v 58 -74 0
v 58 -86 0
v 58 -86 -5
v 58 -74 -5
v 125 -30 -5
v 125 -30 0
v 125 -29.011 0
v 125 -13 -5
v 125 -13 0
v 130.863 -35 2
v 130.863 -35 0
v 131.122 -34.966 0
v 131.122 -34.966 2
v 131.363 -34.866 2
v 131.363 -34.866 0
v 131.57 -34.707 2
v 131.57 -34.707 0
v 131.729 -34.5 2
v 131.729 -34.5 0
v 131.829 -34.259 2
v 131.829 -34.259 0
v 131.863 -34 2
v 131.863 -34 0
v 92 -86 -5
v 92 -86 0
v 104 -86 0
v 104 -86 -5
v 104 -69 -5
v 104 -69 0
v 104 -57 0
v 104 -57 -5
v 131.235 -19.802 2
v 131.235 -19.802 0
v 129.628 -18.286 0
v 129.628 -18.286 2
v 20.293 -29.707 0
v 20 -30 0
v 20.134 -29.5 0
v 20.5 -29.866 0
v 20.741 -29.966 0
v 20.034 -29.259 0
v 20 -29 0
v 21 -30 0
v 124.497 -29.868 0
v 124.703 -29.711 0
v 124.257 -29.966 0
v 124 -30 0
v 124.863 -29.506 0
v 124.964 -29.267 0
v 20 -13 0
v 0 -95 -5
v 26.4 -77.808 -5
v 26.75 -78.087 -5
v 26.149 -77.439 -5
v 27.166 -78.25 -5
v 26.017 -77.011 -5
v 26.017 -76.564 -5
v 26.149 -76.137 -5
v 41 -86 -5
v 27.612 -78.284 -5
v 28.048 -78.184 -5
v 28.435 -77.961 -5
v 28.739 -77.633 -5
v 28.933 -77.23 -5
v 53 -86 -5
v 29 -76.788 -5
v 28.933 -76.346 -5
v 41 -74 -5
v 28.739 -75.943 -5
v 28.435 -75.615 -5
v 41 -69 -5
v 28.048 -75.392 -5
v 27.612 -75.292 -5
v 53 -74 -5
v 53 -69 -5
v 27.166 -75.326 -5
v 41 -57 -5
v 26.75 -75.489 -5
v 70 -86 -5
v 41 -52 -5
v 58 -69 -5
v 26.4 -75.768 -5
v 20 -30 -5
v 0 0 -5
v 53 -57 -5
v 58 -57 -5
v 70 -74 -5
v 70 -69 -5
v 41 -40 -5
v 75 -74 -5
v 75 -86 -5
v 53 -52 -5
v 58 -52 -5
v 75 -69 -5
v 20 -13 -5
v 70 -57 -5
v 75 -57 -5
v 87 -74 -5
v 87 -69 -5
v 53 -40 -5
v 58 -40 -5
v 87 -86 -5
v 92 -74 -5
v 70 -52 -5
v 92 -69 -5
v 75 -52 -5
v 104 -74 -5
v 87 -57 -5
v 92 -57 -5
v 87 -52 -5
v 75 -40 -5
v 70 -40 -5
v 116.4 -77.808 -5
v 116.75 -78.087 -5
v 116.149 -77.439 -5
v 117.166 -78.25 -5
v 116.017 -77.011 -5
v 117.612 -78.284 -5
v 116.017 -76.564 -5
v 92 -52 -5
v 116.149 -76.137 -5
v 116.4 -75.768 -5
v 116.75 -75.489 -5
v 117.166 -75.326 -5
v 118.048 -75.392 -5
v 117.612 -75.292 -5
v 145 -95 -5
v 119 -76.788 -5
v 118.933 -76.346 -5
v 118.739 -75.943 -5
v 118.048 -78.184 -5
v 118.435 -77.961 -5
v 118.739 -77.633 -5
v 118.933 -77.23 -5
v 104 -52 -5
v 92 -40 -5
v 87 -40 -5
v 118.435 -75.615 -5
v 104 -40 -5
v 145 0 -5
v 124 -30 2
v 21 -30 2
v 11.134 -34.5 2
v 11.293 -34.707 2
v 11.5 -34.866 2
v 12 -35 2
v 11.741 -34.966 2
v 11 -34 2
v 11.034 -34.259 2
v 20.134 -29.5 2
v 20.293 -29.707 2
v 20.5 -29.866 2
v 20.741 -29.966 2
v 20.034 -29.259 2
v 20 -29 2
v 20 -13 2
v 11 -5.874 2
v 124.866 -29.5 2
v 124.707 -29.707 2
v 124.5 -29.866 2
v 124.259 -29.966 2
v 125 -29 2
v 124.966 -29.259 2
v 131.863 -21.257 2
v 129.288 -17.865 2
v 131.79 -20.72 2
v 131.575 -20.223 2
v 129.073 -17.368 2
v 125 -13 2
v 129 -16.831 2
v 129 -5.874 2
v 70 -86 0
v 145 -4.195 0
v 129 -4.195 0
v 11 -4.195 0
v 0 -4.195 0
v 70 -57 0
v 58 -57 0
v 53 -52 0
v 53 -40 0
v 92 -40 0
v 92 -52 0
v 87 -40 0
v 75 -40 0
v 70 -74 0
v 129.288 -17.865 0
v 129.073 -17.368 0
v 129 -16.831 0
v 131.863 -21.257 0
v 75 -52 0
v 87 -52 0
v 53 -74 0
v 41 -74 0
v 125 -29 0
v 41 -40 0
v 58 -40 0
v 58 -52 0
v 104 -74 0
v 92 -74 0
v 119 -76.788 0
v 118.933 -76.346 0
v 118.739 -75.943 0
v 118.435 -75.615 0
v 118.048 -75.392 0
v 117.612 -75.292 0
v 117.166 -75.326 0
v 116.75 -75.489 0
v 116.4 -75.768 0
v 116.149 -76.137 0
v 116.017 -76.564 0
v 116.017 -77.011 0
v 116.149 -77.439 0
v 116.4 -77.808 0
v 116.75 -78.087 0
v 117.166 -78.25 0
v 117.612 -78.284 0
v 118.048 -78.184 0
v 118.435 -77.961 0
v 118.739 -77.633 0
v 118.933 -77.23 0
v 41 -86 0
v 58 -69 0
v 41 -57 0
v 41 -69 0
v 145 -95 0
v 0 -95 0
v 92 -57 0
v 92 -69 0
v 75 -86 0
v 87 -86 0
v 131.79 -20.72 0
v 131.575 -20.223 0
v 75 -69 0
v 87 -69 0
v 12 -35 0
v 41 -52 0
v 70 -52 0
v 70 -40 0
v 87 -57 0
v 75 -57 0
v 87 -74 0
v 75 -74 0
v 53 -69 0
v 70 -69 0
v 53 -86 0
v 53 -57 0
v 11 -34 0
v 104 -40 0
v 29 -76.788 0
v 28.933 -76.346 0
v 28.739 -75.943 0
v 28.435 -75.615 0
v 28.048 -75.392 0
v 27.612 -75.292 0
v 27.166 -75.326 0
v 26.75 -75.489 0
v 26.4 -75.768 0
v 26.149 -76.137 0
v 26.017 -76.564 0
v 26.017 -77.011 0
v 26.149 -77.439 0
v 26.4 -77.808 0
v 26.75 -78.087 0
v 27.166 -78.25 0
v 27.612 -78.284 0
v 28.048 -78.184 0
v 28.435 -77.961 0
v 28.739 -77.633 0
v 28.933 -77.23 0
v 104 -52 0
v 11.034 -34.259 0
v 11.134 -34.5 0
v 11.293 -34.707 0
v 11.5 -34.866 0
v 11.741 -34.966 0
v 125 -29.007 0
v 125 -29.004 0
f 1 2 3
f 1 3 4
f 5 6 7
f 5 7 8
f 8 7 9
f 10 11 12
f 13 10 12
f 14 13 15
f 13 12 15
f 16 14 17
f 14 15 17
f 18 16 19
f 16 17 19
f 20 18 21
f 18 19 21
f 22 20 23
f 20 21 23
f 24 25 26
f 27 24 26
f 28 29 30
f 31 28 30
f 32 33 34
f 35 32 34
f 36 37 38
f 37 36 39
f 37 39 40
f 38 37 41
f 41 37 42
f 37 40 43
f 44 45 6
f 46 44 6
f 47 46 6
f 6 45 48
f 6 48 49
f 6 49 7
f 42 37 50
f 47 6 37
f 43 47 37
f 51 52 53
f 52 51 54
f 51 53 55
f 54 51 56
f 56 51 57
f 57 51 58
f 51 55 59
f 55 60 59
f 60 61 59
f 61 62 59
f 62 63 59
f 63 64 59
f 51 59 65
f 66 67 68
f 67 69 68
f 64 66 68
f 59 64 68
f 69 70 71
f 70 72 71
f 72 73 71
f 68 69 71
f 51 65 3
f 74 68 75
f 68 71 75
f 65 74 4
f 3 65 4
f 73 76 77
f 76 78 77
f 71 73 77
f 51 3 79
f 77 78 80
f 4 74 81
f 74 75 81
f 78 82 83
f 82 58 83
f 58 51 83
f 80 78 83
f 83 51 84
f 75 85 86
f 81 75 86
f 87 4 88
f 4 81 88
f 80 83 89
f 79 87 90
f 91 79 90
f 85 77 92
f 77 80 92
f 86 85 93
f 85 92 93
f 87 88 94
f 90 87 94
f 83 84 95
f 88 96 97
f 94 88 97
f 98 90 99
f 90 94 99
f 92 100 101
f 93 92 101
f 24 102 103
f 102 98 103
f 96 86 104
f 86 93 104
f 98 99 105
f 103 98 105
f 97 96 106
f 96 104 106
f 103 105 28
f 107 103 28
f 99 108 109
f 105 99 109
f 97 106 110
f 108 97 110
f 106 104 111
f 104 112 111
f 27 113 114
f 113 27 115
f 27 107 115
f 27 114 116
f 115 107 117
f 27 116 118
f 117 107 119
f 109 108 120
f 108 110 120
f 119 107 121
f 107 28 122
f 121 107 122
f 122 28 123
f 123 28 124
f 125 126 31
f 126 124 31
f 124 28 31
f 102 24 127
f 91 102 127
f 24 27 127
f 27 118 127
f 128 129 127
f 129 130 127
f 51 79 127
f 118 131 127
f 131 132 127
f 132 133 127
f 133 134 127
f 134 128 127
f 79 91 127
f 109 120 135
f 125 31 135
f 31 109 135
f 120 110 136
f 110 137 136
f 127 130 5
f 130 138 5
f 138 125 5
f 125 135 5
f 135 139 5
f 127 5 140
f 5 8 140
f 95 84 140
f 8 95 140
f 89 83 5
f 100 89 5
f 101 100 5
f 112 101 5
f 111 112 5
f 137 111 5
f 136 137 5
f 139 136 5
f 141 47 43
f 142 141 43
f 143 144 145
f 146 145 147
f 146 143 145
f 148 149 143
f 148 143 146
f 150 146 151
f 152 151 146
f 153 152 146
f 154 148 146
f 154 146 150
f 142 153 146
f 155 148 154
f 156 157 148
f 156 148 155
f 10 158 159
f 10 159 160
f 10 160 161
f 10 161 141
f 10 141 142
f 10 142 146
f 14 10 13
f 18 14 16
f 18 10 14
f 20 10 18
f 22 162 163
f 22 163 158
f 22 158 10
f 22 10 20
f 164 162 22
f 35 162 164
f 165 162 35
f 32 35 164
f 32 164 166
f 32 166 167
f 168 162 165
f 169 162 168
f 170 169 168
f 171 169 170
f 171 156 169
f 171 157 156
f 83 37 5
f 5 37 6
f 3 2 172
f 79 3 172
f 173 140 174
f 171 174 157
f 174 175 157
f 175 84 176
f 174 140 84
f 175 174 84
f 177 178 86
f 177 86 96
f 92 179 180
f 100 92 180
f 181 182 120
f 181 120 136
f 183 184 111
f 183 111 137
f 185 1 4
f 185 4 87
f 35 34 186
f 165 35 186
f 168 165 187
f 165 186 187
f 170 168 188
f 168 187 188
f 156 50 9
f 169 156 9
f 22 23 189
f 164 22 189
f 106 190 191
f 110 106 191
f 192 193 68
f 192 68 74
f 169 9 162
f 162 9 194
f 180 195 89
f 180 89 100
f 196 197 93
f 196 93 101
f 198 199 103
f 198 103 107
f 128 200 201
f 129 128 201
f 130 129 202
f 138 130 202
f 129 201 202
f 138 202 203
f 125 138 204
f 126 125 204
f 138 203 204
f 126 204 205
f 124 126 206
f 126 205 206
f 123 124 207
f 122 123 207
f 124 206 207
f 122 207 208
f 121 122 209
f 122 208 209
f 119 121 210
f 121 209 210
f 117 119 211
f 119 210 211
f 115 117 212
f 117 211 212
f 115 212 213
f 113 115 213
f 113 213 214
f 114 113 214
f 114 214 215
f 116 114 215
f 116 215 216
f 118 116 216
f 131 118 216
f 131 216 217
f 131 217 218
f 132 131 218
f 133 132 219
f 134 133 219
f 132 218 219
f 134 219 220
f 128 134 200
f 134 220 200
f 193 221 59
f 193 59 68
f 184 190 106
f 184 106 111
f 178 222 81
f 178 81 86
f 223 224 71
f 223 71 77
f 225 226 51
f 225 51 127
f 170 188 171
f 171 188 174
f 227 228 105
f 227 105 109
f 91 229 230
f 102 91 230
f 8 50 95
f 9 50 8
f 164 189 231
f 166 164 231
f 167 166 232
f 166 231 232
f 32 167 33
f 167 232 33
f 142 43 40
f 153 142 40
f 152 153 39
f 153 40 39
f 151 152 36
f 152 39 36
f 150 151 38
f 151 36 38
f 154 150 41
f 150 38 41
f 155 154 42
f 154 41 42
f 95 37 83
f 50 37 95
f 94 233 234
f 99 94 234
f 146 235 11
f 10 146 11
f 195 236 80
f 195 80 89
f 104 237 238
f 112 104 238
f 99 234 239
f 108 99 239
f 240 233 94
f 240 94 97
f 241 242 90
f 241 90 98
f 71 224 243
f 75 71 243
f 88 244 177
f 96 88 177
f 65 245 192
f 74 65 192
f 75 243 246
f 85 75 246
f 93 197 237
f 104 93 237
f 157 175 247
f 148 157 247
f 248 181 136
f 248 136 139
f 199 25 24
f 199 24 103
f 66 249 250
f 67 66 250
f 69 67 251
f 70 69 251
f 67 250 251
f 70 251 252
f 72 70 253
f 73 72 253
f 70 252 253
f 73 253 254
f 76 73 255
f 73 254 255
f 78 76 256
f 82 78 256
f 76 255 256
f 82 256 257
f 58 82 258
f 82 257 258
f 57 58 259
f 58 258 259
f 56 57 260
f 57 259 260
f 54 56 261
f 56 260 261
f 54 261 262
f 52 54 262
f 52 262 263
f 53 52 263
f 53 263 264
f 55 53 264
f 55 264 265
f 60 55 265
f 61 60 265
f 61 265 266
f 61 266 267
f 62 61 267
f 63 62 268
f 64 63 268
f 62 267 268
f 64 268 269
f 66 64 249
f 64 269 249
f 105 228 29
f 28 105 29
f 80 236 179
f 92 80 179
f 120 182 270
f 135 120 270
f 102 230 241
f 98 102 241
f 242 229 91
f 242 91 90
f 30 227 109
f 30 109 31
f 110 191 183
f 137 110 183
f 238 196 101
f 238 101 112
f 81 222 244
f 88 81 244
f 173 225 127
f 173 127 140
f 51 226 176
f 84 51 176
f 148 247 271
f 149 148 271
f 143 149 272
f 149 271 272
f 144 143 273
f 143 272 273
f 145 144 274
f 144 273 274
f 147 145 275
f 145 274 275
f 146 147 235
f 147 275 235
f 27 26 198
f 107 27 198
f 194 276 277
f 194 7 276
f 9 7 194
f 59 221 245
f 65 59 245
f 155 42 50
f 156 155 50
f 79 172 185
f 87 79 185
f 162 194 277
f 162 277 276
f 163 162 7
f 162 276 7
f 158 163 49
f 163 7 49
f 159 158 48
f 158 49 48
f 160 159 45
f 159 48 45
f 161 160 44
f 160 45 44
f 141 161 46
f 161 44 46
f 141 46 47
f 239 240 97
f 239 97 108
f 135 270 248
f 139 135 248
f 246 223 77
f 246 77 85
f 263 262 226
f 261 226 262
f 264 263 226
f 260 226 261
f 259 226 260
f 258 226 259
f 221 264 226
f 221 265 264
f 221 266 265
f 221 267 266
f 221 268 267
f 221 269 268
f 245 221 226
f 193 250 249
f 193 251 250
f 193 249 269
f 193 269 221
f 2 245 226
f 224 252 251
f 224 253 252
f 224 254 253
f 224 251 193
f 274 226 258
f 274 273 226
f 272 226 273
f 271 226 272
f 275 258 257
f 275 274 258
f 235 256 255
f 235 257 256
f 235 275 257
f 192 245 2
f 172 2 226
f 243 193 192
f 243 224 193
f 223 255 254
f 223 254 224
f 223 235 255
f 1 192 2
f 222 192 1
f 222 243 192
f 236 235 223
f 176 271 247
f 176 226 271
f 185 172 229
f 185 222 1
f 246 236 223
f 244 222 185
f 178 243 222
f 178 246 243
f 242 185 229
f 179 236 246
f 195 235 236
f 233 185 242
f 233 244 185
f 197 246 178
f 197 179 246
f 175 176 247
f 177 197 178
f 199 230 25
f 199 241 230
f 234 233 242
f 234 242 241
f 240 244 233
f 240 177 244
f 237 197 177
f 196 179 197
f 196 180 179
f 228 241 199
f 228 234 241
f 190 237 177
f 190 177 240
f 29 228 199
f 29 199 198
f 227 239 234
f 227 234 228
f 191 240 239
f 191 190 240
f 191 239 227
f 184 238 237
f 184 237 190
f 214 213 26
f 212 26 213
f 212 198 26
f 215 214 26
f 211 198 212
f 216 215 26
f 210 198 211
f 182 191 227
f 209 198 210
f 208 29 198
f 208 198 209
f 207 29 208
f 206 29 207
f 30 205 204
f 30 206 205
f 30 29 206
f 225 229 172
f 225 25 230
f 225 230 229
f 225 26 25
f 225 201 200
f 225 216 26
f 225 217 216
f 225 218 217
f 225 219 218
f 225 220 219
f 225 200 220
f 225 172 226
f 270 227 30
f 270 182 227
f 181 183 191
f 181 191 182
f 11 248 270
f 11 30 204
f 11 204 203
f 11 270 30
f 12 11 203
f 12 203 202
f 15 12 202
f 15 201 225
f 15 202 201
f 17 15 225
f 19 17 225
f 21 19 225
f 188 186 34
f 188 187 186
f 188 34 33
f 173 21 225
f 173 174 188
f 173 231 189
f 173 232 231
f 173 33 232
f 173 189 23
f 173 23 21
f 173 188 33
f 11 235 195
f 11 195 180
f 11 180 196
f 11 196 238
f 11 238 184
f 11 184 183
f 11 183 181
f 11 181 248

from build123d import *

# Parameters (mm, degrees)
F0_W     = 145
F0_H     = 95
F0_R     = 1.5
F0_W_2   = 12
F0_H_2   = 12
F0_W_3   = 105
F0_H_3   = 17
F1_DEPTH = 5
F3_DEPTH = 2
F5_DEPTH = 200


with BuildPart() as f1:
    # F0 (on Top) → F1 (new body)
    with BuildSketch(Plane.XY):
        with Locations((72.5, -47.5)):
            Rectangle(F0_W, F0_H)
        with Locations((27.5, -76.787904)):
            Circle(F0_R, mode=Mode.SUBTRACT)
        with Locations((47, -80)):
            Rectangle(F0_W_2, F0_H_2, mode=Mode.SUBTRACT)
        with Locations((64, -80)):
            Rectangle(F0_W_2, F0_H_2, mode=Mode.SUBTRACT)
        with Locations((47, -63)):
            Rectangle(F0_W_2, F0_H_2, mode=Mode.SUBTRACT)
        with Locations((64, -63)):
            Rectangle(F0_W_2, F0_H_2, mode=Mode.SUBTRACT)
        with Locations((81, -80)):
            Rectangle(F0_W_2, F0_H_2, mode=Mode.SUBTRACT)
        with Locations((98, -80)):
            Rectangle(F0_W_2, F0_H_2, mode=Mode.SUBTRACT)
        with Locations((117.5, -76.787904)):
            Circle(F0_R, mode=Mode.SUBTRACT)
        with Locations((81, -63)):
            Rectangle(F0_W_2, F0_H_2, mode=Mode.SUBTRACT)
        with Locations((98, -63)):
            Rectangle(F0_W_2, F0_H_2, mode=Mode.SUBTRACT)
        with Locations((47, -46)):
            Rectangle(F0_W_2, F0_H_2, mode=Mode.SUBTRACT)
        with Locations((64, -46)):
            Rectangle(F0_W_2, F0_H_2, mode=Mode.SUBTRACT)
        with Locations((81, -46)):
            Rectangle(F0_W_2, F0_H_2, mode=Mode.SUBTRACT)
        with Locations((98, -46)):
            Rectangle(F0_W_2, F0_H_2, mode=Mode.SUBTRACT)
        with Locations((72.5, -21.5)):
            Rectangle(F0_W_3, F0_H_3, mode=Mode.SUBTRACT)
    extrude(amount=-F1_DEPTH)

    # F2 (on Top) → F3 (join)
    with BuildSketch(Plane.XY):
        with BuildLine():
            Line((129, 0), (11, 0))
            Line((11, 0), (11, -34))
            ThreePointArc((11, -34), (11.292893, -34.707107), (12, -35))
            Line((12, -35), (130.863056, -35))
            ThreePointArc((130.863056, -35), (131.570163, -34.707107), (131.863056, -34))
            Line((131.863056, -34), (131.863056, -21.256752))
            ThreePointArc((131.863056, -21.256752), (131.699365, -20.464306), (131.235085, -19.801577))
            Line((131.235085, -19.801577), (129.627971, -18.286291))
            ThreePointArc((129.627971, -18.286291), (129.163691, -17.623561), (129, -16.831115))
            Line((129, -16.831115), (129, 0))
        make_face()
        with BuildLine():
            Line((20.000057, -28.999976), (20.000057, -12.999976))
            Line((20.000057, -12.999976), (125.000057, -12.999976))
            Line((125.000057, -12.999976), (125.000057, -28.999976))
            ThreePointArc((125.000057, -28.999976), (124.707164, -29.707083), (124.000057, -29.999976))
            Line((124.000057, -29.999976), (21.000057, -29.999976))
            ThreePointArc((21.000057, -29.999976), (20.292951, -29.707083), (20.000057, -28.999976))
        make_face(mode=Mode.SUBTRACT)
    extrude(amount=F3_DEPTH)

    # F4 (on face) → F5 (cut)
    with BuildSketch(Plane(origin=(0, 0, 0), x_dir=(0, -1, 0), z_dir=(-1, 0, 0))):
        Polygon((0, 5), (0, -5), (8.390996, 5), align=None)
    extrude(amount=-F5_DEPTH, mode=Mode.SUBTRACT)


solid = f1.part
